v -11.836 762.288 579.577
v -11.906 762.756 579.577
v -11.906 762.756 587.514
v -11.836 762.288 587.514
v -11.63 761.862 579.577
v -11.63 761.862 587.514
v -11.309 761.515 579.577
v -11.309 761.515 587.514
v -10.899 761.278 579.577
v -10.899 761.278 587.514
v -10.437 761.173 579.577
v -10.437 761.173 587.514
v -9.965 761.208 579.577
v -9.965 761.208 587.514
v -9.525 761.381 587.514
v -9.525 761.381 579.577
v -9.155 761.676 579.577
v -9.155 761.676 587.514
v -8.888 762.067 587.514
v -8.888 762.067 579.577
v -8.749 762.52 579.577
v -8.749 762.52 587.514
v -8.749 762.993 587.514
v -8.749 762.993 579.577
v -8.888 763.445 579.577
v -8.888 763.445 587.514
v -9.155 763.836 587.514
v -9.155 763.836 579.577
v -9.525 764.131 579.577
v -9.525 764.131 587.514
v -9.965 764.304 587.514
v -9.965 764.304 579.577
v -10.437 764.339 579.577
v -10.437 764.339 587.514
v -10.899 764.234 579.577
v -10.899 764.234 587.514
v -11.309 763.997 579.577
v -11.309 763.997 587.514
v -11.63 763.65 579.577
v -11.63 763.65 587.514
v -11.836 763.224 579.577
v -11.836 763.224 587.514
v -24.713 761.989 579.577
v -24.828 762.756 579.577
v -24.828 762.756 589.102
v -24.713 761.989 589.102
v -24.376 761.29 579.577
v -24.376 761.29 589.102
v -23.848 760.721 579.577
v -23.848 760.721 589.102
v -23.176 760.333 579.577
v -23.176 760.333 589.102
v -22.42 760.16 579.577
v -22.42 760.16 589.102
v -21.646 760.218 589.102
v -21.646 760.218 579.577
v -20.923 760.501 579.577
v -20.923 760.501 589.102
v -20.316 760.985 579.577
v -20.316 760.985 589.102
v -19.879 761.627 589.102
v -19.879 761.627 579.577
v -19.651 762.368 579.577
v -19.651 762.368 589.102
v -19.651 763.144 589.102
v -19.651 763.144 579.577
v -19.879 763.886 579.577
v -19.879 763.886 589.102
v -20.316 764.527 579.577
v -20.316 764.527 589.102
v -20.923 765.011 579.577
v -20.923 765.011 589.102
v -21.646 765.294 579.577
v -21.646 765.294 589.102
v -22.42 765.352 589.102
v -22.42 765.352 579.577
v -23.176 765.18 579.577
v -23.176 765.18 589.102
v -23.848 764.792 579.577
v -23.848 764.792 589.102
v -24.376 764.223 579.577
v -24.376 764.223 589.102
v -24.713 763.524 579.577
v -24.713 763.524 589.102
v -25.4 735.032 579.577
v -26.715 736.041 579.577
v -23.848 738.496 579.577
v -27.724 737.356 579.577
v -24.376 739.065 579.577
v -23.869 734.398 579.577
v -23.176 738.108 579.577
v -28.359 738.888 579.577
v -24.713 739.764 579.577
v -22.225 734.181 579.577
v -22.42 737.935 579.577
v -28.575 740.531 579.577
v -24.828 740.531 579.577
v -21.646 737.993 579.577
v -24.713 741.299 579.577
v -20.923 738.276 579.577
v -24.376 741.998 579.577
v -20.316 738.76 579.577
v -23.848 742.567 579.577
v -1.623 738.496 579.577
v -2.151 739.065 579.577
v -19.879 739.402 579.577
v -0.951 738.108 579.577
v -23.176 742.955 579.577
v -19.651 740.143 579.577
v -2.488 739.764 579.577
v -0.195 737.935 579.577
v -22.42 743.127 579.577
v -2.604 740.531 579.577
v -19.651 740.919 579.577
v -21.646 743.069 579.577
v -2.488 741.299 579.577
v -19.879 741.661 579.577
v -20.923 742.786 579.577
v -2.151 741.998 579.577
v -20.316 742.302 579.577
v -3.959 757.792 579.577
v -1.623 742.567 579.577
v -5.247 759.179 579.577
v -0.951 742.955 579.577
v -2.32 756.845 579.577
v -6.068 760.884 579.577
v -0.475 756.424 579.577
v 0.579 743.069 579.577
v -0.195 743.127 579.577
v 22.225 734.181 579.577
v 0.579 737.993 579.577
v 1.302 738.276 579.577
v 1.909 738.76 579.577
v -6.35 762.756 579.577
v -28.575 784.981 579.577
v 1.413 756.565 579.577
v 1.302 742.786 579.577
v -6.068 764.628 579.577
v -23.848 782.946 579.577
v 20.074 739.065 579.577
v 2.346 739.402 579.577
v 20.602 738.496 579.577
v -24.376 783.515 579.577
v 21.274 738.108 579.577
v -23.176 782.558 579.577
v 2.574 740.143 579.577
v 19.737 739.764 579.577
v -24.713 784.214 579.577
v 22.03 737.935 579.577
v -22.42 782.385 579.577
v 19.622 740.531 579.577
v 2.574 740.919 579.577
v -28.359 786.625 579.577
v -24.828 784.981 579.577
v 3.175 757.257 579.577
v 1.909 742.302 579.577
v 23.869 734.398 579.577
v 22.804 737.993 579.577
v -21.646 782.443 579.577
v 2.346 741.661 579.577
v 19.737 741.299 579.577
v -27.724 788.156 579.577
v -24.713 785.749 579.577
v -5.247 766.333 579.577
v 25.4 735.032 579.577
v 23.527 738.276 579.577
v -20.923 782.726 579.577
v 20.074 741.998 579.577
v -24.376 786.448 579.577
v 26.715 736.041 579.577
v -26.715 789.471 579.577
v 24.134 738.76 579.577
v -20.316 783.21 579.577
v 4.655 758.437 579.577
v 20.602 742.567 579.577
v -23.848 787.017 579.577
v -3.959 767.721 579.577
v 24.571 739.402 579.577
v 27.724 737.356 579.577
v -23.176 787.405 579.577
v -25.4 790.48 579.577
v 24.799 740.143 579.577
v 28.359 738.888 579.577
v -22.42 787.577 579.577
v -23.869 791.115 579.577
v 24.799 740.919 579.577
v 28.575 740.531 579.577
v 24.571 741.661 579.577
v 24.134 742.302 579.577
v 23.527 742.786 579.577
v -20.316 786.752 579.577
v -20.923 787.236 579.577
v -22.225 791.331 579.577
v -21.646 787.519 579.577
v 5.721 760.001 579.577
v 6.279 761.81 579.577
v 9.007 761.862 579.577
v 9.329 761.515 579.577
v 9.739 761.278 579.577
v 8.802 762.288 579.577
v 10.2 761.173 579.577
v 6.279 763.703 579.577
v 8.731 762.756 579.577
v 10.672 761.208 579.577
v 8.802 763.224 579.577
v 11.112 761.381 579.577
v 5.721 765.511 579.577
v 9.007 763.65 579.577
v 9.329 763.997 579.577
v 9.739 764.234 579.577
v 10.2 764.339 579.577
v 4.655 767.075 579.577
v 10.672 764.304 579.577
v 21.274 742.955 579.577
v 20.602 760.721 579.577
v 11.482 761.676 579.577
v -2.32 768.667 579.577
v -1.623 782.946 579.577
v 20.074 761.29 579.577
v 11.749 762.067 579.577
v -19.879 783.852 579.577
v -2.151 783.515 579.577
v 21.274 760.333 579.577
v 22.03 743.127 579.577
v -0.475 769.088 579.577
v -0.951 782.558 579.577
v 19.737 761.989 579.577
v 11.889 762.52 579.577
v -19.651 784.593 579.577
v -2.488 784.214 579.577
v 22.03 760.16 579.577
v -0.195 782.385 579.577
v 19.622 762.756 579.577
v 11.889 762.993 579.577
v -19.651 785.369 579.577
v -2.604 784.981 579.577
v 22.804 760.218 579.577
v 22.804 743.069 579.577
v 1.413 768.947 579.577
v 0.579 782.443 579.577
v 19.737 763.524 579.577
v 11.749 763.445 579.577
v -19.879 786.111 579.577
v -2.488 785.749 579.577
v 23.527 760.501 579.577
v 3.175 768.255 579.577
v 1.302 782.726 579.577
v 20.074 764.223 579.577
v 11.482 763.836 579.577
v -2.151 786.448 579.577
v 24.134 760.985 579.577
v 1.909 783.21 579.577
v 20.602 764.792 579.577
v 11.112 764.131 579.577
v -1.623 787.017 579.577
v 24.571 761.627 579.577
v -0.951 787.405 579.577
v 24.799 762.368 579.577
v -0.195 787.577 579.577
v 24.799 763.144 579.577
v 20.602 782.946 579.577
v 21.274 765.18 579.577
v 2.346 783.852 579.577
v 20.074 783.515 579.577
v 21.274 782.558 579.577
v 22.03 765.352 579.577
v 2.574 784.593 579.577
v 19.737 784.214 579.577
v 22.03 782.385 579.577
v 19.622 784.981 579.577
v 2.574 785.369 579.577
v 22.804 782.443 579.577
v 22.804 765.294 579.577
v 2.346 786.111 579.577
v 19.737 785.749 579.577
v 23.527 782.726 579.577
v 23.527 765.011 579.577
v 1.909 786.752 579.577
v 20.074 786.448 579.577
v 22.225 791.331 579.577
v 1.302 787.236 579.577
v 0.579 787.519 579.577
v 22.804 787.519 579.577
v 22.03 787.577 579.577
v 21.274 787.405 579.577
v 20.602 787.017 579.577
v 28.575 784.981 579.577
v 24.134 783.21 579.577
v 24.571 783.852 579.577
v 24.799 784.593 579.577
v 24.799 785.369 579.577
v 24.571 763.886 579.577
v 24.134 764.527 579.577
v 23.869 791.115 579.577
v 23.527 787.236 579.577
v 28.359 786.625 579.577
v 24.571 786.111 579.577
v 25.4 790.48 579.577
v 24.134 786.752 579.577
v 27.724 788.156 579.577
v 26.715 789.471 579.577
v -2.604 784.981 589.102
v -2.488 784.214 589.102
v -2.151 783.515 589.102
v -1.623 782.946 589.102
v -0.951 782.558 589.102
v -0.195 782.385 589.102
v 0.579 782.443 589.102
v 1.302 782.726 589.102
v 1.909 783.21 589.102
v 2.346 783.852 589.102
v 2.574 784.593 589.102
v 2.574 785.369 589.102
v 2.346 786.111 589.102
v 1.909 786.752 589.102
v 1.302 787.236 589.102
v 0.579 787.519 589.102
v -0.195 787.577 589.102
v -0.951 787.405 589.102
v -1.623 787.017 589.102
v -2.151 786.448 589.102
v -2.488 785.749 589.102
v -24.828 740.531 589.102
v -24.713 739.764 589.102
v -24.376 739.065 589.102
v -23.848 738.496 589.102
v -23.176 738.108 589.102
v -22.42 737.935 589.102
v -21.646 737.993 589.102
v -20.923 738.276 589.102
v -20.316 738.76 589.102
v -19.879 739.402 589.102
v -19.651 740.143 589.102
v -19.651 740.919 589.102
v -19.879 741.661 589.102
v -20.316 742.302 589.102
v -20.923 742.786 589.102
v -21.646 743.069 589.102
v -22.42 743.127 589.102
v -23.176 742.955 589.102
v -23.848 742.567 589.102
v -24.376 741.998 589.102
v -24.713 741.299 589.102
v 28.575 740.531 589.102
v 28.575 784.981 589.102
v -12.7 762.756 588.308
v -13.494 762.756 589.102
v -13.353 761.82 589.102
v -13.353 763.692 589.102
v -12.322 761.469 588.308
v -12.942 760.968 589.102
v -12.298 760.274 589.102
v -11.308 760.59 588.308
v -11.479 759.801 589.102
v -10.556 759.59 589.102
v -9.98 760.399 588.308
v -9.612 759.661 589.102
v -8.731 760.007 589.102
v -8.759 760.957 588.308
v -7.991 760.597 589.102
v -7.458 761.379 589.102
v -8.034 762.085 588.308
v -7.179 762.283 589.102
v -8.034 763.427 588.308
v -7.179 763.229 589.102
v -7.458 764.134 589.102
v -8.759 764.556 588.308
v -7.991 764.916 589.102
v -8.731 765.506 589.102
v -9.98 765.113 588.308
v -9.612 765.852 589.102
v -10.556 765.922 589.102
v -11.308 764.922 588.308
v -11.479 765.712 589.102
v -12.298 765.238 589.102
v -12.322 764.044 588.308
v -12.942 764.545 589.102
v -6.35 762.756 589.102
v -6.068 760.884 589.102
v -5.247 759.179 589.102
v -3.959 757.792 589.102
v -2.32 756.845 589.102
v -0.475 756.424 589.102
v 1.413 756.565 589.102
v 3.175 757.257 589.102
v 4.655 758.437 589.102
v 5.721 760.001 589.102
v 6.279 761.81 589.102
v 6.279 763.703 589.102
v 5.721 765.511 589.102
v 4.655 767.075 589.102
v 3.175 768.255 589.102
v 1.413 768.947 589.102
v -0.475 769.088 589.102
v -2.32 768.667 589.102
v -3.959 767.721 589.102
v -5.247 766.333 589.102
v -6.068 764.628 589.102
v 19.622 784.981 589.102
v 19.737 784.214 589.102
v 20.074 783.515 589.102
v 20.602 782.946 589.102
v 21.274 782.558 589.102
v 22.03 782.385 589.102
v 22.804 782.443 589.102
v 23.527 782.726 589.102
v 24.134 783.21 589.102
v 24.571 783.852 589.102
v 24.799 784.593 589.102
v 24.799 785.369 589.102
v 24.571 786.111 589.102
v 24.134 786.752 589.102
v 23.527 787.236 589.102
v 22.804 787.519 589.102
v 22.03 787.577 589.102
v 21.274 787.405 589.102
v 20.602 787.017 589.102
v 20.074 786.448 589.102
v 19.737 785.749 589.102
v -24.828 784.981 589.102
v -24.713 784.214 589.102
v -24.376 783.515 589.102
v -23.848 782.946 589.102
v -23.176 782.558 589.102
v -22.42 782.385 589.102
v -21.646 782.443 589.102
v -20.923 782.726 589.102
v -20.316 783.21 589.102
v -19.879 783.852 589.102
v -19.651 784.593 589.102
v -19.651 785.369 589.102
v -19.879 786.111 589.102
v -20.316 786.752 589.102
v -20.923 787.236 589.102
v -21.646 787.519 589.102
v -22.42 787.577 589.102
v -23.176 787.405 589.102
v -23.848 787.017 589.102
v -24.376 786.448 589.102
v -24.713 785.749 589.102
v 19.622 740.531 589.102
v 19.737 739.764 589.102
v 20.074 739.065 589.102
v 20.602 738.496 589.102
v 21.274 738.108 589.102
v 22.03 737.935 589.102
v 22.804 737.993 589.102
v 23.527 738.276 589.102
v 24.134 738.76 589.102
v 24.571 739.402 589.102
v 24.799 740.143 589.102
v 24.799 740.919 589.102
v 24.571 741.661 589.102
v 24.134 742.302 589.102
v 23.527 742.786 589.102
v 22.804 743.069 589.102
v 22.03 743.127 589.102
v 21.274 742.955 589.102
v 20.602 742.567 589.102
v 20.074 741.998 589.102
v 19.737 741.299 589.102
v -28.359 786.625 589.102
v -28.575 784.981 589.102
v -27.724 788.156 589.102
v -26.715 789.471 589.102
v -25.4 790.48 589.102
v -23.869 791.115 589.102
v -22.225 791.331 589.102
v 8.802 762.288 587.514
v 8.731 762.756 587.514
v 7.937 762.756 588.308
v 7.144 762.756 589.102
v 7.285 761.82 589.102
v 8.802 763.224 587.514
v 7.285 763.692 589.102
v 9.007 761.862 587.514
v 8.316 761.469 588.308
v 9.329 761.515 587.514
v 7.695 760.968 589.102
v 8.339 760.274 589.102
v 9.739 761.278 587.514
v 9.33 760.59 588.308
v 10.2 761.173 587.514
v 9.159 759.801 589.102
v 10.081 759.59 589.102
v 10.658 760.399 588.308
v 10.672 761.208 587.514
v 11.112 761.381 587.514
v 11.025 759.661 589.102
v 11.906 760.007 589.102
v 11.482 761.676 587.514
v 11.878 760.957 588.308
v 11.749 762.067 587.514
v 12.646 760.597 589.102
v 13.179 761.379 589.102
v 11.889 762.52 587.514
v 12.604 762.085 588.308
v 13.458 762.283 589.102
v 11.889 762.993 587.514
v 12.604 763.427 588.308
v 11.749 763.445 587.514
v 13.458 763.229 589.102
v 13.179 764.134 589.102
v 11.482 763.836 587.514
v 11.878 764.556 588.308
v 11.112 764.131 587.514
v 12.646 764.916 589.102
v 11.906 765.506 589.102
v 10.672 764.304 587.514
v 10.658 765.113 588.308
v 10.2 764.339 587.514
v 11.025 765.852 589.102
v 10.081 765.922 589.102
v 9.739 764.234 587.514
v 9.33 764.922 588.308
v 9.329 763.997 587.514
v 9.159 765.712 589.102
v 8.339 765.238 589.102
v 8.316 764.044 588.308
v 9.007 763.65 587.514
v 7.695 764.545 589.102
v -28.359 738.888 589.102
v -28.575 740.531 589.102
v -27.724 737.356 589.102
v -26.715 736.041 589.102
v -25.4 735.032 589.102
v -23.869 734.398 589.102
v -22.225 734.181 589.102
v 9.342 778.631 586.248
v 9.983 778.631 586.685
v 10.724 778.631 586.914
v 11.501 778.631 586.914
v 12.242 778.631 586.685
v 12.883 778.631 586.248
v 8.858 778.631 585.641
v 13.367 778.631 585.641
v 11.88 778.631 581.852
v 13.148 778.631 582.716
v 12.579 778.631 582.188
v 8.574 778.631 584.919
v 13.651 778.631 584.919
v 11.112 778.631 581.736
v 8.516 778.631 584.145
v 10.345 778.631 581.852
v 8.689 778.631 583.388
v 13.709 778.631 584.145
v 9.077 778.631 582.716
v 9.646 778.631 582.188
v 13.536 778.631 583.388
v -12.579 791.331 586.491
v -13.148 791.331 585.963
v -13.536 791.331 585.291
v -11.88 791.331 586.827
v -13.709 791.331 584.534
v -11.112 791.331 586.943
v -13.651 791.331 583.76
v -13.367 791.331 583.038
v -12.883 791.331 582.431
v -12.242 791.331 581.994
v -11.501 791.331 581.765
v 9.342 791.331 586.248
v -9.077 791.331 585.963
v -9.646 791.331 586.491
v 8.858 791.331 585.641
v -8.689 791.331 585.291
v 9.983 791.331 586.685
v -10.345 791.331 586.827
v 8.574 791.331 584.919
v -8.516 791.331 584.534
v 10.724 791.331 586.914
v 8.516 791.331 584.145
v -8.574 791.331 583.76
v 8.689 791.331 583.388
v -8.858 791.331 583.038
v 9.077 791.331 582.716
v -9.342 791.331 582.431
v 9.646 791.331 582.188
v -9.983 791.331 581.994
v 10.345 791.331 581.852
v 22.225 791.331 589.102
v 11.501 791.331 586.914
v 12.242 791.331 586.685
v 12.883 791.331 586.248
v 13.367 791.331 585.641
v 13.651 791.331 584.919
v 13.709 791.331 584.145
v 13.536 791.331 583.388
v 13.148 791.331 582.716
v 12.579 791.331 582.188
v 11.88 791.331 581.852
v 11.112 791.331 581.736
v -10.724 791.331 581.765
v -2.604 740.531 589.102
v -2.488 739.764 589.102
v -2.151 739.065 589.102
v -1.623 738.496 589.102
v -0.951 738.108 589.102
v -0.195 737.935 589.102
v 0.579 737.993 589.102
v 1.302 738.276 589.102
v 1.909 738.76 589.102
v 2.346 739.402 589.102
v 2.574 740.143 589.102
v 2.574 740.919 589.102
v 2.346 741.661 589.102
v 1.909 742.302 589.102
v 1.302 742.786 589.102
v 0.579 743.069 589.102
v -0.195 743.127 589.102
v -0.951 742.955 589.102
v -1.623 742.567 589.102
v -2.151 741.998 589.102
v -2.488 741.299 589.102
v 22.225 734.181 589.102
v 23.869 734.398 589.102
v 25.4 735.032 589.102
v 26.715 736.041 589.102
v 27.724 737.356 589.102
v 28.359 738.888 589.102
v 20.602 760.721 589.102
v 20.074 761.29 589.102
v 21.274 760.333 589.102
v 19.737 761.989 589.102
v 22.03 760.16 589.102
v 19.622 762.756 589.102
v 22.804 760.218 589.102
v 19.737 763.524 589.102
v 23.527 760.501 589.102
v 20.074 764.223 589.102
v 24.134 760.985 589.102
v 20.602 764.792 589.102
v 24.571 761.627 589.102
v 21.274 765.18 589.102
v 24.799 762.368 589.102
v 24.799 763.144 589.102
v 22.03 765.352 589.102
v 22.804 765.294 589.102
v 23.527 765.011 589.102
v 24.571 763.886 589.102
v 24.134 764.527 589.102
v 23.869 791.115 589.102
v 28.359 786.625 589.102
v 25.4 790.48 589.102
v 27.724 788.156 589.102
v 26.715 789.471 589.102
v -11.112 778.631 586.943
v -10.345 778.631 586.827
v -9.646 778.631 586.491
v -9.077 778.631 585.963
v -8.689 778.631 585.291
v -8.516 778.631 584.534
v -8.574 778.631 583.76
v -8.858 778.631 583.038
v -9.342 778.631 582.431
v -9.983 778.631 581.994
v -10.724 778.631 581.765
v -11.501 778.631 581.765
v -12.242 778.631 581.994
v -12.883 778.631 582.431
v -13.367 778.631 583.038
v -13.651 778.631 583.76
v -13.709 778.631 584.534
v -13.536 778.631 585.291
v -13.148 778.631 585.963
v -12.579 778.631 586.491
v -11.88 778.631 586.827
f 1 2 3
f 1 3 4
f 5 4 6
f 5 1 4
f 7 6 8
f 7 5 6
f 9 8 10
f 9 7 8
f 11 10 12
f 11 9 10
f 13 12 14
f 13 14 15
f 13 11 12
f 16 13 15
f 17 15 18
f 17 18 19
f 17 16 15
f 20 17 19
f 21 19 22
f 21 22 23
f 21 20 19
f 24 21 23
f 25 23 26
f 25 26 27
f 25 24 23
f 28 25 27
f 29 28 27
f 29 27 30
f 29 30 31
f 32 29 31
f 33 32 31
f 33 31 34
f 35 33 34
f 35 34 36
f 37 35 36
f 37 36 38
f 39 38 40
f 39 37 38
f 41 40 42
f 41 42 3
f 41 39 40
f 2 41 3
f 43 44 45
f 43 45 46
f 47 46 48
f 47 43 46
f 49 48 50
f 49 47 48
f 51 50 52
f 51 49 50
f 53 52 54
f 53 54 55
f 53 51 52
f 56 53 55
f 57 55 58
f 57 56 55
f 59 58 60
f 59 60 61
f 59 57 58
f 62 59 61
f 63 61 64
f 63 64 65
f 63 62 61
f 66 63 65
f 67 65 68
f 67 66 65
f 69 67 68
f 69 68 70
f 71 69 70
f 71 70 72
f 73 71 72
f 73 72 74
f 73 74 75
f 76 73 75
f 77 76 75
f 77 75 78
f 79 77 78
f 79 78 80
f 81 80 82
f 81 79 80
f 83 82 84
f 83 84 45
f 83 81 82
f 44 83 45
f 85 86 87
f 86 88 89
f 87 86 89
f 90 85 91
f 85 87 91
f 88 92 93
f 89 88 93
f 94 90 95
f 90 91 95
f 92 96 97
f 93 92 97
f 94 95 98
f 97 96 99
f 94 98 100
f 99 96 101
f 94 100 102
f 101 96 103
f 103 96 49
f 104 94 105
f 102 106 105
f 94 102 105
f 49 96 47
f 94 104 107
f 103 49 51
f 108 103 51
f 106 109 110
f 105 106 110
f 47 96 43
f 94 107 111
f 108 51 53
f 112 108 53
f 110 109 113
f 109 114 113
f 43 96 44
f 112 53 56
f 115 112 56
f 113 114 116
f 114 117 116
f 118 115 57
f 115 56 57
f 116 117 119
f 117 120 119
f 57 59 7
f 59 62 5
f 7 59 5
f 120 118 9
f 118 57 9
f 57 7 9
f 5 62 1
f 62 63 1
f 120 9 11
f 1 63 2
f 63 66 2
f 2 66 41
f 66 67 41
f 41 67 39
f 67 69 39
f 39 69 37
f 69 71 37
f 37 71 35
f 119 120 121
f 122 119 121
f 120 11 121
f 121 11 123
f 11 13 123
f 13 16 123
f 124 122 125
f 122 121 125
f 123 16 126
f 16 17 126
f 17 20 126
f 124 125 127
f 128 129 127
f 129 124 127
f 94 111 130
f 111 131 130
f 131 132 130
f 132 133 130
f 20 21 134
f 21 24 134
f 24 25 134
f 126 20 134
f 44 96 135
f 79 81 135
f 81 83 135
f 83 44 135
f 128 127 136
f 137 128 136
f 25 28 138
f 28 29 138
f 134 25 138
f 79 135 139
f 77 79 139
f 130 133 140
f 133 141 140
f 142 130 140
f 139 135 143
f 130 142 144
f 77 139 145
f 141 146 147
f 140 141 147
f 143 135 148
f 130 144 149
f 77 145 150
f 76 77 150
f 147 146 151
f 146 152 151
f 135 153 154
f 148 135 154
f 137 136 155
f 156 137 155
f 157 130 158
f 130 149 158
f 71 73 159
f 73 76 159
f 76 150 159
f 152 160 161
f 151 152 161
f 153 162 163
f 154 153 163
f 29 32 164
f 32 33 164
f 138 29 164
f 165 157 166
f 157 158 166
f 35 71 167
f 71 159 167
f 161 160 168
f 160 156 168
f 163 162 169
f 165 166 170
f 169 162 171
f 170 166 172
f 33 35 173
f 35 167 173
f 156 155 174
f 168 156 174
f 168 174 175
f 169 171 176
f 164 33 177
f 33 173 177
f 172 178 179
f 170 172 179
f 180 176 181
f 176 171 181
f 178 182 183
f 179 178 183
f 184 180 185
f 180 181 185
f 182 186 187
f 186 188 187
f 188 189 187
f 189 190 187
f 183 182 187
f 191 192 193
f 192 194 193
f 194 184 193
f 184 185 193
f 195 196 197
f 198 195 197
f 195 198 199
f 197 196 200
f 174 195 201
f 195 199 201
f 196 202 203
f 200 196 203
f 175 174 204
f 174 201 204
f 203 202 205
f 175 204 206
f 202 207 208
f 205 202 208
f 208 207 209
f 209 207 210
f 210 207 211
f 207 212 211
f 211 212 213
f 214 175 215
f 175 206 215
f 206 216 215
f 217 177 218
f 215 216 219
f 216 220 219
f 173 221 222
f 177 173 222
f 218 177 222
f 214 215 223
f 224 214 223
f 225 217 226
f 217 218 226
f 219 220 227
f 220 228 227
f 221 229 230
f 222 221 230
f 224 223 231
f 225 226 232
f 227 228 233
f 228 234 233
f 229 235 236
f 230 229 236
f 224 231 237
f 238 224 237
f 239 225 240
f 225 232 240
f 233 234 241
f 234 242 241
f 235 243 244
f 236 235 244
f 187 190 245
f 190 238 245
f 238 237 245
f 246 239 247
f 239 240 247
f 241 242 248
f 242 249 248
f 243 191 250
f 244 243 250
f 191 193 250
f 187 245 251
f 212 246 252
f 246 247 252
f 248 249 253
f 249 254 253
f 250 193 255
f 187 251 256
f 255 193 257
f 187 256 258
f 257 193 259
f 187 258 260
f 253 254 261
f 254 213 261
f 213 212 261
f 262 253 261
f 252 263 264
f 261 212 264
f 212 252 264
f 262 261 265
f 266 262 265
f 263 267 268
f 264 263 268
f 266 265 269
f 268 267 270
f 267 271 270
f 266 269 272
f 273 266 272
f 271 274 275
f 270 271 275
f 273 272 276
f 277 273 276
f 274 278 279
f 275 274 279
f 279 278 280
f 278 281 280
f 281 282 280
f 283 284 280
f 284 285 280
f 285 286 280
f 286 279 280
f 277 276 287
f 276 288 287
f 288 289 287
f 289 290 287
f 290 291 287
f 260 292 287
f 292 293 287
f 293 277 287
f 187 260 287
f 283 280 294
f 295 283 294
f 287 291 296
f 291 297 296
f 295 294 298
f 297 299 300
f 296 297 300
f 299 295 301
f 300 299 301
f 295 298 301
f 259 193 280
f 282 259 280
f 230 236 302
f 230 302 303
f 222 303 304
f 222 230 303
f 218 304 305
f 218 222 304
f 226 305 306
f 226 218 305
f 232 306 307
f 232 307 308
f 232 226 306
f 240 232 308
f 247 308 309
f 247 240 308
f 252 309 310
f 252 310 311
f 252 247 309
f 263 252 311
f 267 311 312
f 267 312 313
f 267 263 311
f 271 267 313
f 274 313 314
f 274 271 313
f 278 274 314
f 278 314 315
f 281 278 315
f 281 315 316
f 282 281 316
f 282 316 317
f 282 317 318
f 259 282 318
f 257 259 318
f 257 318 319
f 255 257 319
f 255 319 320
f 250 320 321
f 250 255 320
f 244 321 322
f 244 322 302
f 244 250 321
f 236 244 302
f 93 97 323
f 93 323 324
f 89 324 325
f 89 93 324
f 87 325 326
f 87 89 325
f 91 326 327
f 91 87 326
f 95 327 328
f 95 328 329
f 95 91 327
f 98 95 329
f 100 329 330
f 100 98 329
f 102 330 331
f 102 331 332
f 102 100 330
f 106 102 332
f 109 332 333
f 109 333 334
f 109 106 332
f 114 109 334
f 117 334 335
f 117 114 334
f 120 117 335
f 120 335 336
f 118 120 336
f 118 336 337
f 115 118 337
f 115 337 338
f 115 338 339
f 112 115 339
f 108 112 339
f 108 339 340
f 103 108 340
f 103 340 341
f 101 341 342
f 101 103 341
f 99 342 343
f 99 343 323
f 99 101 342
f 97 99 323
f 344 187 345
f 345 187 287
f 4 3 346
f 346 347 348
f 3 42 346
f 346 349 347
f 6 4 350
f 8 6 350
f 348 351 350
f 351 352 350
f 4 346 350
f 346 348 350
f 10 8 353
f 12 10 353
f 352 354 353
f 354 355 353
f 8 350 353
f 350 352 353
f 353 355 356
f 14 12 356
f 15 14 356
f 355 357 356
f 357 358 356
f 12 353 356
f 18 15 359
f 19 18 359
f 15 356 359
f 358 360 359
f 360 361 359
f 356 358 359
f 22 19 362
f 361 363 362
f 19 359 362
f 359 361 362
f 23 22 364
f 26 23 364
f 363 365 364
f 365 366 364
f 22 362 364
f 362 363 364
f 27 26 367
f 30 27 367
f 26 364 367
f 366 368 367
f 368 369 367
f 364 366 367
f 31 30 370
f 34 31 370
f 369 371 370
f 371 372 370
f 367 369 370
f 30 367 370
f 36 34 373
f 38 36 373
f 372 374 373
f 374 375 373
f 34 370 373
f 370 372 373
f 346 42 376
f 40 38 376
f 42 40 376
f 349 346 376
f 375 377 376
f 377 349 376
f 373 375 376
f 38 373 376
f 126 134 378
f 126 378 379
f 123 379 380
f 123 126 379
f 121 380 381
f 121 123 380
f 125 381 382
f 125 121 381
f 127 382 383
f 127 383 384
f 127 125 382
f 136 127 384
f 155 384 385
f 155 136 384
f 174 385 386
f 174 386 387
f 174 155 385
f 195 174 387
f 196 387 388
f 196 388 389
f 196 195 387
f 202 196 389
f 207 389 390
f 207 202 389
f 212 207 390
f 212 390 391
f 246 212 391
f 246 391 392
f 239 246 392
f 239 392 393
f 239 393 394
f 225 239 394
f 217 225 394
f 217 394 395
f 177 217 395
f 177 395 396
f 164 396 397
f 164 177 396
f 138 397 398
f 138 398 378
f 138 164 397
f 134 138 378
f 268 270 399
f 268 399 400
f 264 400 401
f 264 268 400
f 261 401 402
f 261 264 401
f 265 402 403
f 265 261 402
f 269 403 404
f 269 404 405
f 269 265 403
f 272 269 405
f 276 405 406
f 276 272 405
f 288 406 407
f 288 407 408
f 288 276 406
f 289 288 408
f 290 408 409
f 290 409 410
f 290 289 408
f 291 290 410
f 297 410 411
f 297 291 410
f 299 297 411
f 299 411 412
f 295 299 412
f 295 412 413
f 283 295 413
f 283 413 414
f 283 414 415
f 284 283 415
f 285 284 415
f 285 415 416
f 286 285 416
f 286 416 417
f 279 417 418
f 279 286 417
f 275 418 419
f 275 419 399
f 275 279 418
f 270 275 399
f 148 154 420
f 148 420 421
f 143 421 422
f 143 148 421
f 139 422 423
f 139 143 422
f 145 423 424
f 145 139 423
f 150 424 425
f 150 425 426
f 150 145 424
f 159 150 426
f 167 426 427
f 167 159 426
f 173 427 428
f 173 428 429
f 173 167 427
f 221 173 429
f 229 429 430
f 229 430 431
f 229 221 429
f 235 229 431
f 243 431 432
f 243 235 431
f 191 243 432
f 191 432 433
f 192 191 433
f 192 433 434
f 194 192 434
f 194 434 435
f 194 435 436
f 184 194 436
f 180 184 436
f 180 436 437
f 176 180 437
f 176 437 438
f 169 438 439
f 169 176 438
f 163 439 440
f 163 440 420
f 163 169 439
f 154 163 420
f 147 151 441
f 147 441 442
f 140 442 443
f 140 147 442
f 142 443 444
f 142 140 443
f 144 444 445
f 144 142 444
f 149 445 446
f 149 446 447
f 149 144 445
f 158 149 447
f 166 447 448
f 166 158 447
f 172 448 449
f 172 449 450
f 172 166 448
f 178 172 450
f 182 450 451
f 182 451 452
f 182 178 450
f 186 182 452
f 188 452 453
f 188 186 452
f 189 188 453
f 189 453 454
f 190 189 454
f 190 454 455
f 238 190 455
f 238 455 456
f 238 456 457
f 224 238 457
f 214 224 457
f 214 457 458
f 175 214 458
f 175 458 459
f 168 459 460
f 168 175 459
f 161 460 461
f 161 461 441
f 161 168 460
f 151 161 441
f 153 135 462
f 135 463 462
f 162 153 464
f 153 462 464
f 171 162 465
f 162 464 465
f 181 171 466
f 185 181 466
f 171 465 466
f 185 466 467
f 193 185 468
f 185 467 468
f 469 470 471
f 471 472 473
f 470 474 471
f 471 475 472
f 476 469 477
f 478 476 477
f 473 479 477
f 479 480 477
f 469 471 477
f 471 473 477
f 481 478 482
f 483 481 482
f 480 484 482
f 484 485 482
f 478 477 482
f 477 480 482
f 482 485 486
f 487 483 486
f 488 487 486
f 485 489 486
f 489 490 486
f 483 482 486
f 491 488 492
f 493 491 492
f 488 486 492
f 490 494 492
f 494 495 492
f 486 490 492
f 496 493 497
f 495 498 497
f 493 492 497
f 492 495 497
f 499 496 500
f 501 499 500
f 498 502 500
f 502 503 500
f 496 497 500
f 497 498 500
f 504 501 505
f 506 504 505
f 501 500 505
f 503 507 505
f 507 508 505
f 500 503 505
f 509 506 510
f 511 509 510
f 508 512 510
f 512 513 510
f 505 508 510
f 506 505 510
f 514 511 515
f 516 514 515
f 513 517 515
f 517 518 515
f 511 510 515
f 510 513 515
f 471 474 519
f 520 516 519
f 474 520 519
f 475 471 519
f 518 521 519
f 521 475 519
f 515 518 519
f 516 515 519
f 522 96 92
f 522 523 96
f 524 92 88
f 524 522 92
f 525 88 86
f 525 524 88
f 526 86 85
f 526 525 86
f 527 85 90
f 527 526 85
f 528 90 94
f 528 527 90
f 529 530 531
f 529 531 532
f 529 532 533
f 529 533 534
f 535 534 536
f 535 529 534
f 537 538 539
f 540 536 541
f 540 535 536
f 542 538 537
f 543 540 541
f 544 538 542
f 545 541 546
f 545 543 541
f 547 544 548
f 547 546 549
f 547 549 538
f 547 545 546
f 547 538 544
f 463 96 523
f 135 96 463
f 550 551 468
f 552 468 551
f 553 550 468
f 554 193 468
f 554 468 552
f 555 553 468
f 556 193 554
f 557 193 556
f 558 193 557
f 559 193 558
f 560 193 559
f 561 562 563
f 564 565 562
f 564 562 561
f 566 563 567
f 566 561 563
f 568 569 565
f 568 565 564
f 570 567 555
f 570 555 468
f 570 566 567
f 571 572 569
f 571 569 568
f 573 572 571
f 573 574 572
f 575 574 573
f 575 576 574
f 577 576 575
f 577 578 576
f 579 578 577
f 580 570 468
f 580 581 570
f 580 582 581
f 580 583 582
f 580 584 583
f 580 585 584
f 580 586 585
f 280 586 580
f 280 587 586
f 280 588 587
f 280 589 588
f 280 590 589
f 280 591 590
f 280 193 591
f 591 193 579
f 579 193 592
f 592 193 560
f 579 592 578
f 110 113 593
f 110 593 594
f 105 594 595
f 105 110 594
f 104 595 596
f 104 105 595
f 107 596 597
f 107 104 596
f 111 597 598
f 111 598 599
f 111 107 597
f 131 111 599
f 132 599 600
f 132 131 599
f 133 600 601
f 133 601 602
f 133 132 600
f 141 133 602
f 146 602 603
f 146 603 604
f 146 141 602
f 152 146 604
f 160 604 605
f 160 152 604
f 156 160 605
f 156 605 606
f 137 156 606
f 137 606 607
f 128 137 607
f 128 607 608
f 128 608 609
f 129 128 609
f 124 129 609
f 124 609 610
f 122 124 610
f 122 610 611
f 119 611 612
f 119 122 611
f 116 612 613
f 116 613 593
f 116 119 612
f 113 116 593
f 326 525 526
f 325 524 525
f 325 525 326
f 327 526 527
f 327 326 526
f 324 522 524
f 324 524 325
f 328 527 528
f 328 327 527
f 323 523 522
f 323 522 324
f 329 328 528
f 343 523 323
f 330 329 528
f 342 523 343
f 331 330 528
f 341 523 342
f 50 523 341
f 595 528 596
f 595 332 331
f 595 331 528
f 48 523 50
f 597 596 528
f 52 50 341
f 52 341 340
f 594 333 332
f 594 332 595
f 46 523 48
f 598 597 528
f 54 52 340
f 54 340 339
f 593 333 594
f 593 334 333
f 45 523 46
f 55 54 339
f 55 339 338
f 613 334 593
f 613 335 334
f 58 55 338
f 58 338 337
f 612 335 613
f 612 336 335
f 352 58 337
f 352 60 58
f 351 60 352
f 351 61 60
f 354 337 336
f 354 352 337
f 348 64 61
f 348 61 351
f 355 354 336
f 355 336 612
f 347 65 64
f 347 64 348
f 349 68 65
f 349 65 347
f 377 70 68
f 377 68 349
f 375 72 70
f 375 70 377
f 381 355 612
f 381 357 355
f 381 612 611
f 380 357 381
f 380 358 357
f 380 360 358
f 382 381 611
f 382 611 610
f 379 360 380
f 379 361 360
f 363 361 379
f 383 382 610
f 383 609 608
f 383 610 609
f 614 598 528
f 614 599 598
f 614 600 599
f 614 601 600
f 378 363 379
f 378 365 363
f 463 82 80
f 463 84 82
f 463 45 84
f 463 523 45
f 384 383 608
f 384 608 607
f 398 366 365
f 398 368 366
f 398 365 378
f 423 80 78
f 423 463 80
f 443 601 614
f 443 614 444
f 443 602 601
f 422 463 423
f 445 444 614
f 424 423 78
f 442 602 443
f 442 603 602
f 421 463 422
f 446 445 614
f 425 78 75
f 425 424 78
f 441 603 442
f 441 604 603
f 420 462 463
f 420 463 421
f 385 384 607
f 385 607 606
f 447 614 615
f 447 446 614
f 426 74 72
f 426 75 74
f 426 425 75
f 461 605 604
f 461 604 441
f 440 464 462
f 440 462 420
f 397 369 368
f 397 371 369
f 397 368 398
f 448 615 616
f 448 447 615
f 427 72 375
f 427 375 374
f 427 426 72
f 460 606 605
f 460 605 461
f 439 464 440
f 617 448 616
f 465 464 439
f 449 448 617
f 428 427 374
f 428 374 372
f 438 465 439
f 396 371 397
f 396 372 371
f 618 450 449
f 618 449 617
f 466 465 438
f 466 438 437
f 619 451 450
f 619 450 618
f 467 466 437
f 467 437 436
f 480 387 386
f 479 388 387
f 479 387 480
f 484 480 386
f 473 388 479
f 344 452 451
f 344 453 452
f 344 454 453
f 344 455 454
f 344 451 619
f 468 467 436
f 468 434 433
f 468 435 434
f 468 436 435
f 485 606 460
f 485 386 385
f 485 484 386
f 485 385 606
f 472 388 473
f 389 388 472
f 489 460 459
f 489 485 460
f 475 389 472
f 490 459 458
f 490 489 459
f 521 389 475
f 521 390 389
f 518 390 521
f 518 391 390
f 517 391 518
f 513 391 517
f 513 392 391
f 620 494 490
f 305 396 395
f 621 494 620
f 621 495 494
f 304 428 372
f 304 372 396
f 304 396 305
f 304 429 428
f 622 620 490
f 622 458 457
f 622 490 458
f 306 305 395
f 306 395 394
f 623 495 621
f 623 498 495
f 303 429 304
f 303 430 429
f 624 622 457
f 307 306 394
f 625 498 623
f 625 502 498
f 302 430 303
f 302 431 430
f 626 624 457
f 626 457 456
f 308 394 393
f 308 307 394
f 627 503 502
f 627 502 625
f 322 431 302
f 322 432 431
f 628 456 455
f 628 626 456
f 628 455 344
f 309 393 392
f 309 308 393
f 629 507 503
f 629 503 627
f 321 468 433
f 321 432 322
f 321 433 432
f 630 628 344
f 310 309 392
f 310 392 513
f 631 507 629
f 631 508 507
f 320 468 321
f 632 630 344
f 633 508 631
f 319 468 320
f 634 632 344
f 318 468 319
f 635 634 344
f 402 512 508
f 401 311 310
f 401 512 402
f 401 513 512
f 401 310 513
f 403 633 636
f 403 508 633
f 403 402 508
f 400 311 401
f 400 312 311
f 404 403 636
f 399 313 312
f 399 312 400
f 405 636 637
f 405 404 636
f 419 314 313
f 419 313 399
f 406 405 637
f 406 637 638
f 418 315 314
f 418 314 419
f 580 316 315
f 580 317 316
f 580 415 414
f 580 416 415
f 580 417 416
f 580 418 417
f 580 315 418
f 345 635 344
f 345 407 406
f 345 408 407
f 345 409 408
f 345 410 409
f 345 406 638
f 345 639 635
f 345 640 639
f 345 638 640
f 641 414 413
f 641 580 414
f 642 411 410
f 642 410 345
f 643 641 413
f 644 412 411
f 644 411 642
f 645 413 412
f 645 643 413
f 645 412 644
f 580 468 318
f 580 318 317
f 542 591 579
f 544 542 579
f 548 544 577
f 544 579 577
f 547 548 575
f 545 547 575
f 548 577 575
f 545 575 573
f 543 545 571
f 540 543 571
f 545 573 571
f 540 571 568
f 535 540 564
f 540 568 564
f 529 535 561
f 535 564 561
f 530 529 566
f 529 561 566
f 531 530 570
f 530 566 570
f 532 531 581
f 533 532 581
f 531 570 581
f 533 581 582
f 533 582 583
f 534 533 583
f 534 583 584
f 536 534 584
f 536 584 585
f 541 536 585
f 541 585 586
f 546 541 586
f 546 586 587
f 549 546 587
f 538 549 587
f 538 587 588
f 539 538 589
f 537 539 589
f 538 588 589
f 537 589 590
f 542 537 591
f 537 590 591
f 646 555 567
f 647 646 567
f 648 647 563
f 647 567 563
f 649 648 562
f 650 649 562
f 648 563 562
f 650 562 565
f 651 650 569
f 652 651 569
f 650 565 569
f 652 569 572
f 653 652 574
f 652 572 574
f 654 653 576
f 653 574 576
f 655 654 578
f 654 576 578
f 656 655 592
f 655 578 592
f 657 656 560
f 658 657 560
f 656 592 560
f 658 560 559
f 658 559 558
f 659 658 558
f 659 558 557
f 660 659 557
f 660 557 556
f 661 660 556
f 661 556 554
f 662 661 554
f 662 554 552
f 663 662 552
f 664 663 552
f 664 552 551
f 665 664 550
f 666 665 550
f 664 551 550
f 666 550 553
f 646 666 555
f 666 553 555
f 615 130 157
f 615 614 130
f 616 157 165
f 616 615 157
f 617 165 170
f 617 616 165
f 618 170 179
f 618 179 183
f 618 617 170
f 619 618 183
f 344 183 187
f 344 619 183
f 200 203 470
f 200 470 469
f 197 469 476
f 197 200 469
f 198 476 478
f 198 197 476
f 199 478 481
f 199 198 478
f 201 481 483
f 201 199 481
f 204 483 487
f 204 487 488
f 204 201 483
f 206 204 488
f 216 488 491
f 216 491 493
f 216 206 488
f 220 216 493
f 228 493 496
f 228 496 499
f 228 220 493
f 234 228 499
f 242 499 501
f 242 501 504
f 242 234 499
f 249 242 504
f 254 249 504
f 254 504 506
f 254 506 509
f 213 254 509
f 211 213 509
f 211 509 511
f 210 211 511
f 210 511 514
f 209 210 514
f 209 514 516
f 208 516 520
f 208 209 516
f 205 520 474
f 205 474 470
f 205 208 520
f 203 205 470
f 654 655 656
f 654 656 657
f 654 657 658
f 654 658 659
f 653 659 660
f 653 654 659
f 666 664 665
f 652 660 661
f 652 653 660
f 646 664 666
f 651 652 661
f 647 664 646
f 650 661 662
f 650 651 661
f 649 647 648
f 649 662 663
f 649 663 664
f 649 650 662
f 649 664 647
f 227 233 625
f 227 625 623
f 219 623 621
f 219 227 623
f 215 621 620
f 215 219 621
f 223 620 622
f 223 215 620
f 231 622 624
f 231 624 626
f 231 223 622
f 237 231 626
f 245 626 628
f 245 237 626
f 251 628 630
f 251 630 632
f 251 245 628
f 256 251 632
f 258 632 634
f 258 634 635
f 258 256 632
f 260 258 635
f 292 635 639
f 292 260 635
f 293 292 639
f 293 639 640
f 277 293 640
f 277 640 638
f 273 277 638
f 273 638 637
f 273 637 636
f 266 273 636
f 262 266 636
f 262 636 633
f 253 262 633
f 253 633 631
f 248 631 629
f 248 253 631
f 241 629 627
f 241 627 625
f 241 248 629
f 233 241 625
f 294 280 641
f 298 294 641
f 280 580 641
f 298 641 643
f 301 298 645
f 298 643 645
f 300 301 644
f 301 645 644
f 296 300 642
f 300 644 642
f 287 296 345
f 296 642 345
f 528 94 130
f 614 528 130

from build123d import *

# Parameters (mm, degrees)
SKETCH1_W           = 57.15
SKETCH1_H           = 57.15
SKETCH1_R           = 2.6035
SKETCH1_R_2         = 6.35
SKETCH1_R_3         = 1.5875
BOSS_EXTRUDE1_DEPTH = 9.525
CHAMFER1_SIZE       = 1.5875
FILLET1_R           = 6.35
SKETCH2_R           = 2.6035
CUT_EXTRUDE1_DEPTH  = 12.7


with BuildPart() as part:
    # Sketch1 → Boss-Extrude1 (new body)
    with BuildSketch(Plane.XY.offset(579.576994876)):
        with Locations((0, 762.756140976)):
            Rectangle(SKETCH1_W, SKETCH1_H)
        with Locations(Location((-22.225, 784.981140976, 0), (0, 0, 180))):
            Circle(SKETCH1_R, mode=Mode.SUBTRACT)
        with Locations(Location((0, 762.756140976, 0), (0, 0, 180))):
            Circle(SKETCH1_R_2, mode=Mode.SUBTRACT)
        with Locations(Location((-10.31875, 762.756140976, 0), (0, 0, 180))):
            Circle(SKETCH1_R_3, mode=Mode.SUBTRACT)
        with Locations(Location((10.31875, 762.756140976, 0), (0, 0, 180))):
            Circle(SKETCH1_R_3, mode=Mode.SUBTRACT)
        with Locations(Location((22.225, 784.981140976, 0), (0, 0, 180))):
            Circle(SKETCH1_R, mode=Mode.SUBTRACT)
        with Locations(Location((22.225, 762.756140976, 0), (0, 0, 180))):
            Circle(SKETCH1_R, mode=Mode.SUBTRACT)
        with Locations(Location((0, 784.981140976, 0), (0, 0, 180))):
            Circle(SKETCH1_R, mode=Mode.SUBTRACT)
        with Locations(Location((-22.225, 762.756140976, 0), (0, 0, 180))):
            Circle(SKETCH1_R, mode=Mode.SUBTRACT)
        with Locations(Location((22.225, 740.531140976, 0), (0, 0, 180))):
            Circle(SKETCH1_R, mode=Mode.SUBTRACT)
        with Locations(Location((0, 740.531140976, 0), (0, 0, 180))):
            Circle(SKETCH1_R, mode=Mode.SUBTRACT)
        with Locations(Location((-22.225, 740.531140976, 0), (0, 0, 180))):
            Circle(SKETCH1_R, mode=Mode.SUBTRACT)
    extrude(amount=BOSS_EXTRUDE1_DEPTH)

    # Chamfer1
    chamfer1_edges = [part.edges().sort_by_distance(p)[0] for p in [
        (-8.73125, 762.756140976, 589.101994876),
        (11.90625, 762.756140976, 589.101994876),
    ]]
    chamfer(chamfer1_edges, length=CHAMFER1_SIZE)

    # Fillet1
    fillet1_edges = [part.edges().sort_by_distance(p)[0] for p in [
        (28.575, 734.181140976, 584.339494876),
        (-28.575, 734.181140976, 584.339494876),
        (-28.575, 791.331140976, 584.339494876),
        (28.575, 791.331140976, 584.339494876),
    ]]
    fillet(fillet1_edges, radius=FILLET1_R)

    # Sketch2 → Cut-Extrude1 (cut)
    with BuildSketch(Plane(origin=(0, 791.331140976, 0), x_dir=(1, 0, 0), z_dir=(0, 1, 0))):
        with Locations(Location((-11.1125, -584.339494876, 0), (0, 0, 270))):
            Circle(SKETCH2_R)
        with Locations(Location((11.1125, -584.339494876, 0), (0, 0, 90))):
            Circle(SKETCH2_R)
    extrude(amount=-CUT_EXTRUDE1_DEPTH, mode=Mode.SUBTRACT)


solid = part.part
